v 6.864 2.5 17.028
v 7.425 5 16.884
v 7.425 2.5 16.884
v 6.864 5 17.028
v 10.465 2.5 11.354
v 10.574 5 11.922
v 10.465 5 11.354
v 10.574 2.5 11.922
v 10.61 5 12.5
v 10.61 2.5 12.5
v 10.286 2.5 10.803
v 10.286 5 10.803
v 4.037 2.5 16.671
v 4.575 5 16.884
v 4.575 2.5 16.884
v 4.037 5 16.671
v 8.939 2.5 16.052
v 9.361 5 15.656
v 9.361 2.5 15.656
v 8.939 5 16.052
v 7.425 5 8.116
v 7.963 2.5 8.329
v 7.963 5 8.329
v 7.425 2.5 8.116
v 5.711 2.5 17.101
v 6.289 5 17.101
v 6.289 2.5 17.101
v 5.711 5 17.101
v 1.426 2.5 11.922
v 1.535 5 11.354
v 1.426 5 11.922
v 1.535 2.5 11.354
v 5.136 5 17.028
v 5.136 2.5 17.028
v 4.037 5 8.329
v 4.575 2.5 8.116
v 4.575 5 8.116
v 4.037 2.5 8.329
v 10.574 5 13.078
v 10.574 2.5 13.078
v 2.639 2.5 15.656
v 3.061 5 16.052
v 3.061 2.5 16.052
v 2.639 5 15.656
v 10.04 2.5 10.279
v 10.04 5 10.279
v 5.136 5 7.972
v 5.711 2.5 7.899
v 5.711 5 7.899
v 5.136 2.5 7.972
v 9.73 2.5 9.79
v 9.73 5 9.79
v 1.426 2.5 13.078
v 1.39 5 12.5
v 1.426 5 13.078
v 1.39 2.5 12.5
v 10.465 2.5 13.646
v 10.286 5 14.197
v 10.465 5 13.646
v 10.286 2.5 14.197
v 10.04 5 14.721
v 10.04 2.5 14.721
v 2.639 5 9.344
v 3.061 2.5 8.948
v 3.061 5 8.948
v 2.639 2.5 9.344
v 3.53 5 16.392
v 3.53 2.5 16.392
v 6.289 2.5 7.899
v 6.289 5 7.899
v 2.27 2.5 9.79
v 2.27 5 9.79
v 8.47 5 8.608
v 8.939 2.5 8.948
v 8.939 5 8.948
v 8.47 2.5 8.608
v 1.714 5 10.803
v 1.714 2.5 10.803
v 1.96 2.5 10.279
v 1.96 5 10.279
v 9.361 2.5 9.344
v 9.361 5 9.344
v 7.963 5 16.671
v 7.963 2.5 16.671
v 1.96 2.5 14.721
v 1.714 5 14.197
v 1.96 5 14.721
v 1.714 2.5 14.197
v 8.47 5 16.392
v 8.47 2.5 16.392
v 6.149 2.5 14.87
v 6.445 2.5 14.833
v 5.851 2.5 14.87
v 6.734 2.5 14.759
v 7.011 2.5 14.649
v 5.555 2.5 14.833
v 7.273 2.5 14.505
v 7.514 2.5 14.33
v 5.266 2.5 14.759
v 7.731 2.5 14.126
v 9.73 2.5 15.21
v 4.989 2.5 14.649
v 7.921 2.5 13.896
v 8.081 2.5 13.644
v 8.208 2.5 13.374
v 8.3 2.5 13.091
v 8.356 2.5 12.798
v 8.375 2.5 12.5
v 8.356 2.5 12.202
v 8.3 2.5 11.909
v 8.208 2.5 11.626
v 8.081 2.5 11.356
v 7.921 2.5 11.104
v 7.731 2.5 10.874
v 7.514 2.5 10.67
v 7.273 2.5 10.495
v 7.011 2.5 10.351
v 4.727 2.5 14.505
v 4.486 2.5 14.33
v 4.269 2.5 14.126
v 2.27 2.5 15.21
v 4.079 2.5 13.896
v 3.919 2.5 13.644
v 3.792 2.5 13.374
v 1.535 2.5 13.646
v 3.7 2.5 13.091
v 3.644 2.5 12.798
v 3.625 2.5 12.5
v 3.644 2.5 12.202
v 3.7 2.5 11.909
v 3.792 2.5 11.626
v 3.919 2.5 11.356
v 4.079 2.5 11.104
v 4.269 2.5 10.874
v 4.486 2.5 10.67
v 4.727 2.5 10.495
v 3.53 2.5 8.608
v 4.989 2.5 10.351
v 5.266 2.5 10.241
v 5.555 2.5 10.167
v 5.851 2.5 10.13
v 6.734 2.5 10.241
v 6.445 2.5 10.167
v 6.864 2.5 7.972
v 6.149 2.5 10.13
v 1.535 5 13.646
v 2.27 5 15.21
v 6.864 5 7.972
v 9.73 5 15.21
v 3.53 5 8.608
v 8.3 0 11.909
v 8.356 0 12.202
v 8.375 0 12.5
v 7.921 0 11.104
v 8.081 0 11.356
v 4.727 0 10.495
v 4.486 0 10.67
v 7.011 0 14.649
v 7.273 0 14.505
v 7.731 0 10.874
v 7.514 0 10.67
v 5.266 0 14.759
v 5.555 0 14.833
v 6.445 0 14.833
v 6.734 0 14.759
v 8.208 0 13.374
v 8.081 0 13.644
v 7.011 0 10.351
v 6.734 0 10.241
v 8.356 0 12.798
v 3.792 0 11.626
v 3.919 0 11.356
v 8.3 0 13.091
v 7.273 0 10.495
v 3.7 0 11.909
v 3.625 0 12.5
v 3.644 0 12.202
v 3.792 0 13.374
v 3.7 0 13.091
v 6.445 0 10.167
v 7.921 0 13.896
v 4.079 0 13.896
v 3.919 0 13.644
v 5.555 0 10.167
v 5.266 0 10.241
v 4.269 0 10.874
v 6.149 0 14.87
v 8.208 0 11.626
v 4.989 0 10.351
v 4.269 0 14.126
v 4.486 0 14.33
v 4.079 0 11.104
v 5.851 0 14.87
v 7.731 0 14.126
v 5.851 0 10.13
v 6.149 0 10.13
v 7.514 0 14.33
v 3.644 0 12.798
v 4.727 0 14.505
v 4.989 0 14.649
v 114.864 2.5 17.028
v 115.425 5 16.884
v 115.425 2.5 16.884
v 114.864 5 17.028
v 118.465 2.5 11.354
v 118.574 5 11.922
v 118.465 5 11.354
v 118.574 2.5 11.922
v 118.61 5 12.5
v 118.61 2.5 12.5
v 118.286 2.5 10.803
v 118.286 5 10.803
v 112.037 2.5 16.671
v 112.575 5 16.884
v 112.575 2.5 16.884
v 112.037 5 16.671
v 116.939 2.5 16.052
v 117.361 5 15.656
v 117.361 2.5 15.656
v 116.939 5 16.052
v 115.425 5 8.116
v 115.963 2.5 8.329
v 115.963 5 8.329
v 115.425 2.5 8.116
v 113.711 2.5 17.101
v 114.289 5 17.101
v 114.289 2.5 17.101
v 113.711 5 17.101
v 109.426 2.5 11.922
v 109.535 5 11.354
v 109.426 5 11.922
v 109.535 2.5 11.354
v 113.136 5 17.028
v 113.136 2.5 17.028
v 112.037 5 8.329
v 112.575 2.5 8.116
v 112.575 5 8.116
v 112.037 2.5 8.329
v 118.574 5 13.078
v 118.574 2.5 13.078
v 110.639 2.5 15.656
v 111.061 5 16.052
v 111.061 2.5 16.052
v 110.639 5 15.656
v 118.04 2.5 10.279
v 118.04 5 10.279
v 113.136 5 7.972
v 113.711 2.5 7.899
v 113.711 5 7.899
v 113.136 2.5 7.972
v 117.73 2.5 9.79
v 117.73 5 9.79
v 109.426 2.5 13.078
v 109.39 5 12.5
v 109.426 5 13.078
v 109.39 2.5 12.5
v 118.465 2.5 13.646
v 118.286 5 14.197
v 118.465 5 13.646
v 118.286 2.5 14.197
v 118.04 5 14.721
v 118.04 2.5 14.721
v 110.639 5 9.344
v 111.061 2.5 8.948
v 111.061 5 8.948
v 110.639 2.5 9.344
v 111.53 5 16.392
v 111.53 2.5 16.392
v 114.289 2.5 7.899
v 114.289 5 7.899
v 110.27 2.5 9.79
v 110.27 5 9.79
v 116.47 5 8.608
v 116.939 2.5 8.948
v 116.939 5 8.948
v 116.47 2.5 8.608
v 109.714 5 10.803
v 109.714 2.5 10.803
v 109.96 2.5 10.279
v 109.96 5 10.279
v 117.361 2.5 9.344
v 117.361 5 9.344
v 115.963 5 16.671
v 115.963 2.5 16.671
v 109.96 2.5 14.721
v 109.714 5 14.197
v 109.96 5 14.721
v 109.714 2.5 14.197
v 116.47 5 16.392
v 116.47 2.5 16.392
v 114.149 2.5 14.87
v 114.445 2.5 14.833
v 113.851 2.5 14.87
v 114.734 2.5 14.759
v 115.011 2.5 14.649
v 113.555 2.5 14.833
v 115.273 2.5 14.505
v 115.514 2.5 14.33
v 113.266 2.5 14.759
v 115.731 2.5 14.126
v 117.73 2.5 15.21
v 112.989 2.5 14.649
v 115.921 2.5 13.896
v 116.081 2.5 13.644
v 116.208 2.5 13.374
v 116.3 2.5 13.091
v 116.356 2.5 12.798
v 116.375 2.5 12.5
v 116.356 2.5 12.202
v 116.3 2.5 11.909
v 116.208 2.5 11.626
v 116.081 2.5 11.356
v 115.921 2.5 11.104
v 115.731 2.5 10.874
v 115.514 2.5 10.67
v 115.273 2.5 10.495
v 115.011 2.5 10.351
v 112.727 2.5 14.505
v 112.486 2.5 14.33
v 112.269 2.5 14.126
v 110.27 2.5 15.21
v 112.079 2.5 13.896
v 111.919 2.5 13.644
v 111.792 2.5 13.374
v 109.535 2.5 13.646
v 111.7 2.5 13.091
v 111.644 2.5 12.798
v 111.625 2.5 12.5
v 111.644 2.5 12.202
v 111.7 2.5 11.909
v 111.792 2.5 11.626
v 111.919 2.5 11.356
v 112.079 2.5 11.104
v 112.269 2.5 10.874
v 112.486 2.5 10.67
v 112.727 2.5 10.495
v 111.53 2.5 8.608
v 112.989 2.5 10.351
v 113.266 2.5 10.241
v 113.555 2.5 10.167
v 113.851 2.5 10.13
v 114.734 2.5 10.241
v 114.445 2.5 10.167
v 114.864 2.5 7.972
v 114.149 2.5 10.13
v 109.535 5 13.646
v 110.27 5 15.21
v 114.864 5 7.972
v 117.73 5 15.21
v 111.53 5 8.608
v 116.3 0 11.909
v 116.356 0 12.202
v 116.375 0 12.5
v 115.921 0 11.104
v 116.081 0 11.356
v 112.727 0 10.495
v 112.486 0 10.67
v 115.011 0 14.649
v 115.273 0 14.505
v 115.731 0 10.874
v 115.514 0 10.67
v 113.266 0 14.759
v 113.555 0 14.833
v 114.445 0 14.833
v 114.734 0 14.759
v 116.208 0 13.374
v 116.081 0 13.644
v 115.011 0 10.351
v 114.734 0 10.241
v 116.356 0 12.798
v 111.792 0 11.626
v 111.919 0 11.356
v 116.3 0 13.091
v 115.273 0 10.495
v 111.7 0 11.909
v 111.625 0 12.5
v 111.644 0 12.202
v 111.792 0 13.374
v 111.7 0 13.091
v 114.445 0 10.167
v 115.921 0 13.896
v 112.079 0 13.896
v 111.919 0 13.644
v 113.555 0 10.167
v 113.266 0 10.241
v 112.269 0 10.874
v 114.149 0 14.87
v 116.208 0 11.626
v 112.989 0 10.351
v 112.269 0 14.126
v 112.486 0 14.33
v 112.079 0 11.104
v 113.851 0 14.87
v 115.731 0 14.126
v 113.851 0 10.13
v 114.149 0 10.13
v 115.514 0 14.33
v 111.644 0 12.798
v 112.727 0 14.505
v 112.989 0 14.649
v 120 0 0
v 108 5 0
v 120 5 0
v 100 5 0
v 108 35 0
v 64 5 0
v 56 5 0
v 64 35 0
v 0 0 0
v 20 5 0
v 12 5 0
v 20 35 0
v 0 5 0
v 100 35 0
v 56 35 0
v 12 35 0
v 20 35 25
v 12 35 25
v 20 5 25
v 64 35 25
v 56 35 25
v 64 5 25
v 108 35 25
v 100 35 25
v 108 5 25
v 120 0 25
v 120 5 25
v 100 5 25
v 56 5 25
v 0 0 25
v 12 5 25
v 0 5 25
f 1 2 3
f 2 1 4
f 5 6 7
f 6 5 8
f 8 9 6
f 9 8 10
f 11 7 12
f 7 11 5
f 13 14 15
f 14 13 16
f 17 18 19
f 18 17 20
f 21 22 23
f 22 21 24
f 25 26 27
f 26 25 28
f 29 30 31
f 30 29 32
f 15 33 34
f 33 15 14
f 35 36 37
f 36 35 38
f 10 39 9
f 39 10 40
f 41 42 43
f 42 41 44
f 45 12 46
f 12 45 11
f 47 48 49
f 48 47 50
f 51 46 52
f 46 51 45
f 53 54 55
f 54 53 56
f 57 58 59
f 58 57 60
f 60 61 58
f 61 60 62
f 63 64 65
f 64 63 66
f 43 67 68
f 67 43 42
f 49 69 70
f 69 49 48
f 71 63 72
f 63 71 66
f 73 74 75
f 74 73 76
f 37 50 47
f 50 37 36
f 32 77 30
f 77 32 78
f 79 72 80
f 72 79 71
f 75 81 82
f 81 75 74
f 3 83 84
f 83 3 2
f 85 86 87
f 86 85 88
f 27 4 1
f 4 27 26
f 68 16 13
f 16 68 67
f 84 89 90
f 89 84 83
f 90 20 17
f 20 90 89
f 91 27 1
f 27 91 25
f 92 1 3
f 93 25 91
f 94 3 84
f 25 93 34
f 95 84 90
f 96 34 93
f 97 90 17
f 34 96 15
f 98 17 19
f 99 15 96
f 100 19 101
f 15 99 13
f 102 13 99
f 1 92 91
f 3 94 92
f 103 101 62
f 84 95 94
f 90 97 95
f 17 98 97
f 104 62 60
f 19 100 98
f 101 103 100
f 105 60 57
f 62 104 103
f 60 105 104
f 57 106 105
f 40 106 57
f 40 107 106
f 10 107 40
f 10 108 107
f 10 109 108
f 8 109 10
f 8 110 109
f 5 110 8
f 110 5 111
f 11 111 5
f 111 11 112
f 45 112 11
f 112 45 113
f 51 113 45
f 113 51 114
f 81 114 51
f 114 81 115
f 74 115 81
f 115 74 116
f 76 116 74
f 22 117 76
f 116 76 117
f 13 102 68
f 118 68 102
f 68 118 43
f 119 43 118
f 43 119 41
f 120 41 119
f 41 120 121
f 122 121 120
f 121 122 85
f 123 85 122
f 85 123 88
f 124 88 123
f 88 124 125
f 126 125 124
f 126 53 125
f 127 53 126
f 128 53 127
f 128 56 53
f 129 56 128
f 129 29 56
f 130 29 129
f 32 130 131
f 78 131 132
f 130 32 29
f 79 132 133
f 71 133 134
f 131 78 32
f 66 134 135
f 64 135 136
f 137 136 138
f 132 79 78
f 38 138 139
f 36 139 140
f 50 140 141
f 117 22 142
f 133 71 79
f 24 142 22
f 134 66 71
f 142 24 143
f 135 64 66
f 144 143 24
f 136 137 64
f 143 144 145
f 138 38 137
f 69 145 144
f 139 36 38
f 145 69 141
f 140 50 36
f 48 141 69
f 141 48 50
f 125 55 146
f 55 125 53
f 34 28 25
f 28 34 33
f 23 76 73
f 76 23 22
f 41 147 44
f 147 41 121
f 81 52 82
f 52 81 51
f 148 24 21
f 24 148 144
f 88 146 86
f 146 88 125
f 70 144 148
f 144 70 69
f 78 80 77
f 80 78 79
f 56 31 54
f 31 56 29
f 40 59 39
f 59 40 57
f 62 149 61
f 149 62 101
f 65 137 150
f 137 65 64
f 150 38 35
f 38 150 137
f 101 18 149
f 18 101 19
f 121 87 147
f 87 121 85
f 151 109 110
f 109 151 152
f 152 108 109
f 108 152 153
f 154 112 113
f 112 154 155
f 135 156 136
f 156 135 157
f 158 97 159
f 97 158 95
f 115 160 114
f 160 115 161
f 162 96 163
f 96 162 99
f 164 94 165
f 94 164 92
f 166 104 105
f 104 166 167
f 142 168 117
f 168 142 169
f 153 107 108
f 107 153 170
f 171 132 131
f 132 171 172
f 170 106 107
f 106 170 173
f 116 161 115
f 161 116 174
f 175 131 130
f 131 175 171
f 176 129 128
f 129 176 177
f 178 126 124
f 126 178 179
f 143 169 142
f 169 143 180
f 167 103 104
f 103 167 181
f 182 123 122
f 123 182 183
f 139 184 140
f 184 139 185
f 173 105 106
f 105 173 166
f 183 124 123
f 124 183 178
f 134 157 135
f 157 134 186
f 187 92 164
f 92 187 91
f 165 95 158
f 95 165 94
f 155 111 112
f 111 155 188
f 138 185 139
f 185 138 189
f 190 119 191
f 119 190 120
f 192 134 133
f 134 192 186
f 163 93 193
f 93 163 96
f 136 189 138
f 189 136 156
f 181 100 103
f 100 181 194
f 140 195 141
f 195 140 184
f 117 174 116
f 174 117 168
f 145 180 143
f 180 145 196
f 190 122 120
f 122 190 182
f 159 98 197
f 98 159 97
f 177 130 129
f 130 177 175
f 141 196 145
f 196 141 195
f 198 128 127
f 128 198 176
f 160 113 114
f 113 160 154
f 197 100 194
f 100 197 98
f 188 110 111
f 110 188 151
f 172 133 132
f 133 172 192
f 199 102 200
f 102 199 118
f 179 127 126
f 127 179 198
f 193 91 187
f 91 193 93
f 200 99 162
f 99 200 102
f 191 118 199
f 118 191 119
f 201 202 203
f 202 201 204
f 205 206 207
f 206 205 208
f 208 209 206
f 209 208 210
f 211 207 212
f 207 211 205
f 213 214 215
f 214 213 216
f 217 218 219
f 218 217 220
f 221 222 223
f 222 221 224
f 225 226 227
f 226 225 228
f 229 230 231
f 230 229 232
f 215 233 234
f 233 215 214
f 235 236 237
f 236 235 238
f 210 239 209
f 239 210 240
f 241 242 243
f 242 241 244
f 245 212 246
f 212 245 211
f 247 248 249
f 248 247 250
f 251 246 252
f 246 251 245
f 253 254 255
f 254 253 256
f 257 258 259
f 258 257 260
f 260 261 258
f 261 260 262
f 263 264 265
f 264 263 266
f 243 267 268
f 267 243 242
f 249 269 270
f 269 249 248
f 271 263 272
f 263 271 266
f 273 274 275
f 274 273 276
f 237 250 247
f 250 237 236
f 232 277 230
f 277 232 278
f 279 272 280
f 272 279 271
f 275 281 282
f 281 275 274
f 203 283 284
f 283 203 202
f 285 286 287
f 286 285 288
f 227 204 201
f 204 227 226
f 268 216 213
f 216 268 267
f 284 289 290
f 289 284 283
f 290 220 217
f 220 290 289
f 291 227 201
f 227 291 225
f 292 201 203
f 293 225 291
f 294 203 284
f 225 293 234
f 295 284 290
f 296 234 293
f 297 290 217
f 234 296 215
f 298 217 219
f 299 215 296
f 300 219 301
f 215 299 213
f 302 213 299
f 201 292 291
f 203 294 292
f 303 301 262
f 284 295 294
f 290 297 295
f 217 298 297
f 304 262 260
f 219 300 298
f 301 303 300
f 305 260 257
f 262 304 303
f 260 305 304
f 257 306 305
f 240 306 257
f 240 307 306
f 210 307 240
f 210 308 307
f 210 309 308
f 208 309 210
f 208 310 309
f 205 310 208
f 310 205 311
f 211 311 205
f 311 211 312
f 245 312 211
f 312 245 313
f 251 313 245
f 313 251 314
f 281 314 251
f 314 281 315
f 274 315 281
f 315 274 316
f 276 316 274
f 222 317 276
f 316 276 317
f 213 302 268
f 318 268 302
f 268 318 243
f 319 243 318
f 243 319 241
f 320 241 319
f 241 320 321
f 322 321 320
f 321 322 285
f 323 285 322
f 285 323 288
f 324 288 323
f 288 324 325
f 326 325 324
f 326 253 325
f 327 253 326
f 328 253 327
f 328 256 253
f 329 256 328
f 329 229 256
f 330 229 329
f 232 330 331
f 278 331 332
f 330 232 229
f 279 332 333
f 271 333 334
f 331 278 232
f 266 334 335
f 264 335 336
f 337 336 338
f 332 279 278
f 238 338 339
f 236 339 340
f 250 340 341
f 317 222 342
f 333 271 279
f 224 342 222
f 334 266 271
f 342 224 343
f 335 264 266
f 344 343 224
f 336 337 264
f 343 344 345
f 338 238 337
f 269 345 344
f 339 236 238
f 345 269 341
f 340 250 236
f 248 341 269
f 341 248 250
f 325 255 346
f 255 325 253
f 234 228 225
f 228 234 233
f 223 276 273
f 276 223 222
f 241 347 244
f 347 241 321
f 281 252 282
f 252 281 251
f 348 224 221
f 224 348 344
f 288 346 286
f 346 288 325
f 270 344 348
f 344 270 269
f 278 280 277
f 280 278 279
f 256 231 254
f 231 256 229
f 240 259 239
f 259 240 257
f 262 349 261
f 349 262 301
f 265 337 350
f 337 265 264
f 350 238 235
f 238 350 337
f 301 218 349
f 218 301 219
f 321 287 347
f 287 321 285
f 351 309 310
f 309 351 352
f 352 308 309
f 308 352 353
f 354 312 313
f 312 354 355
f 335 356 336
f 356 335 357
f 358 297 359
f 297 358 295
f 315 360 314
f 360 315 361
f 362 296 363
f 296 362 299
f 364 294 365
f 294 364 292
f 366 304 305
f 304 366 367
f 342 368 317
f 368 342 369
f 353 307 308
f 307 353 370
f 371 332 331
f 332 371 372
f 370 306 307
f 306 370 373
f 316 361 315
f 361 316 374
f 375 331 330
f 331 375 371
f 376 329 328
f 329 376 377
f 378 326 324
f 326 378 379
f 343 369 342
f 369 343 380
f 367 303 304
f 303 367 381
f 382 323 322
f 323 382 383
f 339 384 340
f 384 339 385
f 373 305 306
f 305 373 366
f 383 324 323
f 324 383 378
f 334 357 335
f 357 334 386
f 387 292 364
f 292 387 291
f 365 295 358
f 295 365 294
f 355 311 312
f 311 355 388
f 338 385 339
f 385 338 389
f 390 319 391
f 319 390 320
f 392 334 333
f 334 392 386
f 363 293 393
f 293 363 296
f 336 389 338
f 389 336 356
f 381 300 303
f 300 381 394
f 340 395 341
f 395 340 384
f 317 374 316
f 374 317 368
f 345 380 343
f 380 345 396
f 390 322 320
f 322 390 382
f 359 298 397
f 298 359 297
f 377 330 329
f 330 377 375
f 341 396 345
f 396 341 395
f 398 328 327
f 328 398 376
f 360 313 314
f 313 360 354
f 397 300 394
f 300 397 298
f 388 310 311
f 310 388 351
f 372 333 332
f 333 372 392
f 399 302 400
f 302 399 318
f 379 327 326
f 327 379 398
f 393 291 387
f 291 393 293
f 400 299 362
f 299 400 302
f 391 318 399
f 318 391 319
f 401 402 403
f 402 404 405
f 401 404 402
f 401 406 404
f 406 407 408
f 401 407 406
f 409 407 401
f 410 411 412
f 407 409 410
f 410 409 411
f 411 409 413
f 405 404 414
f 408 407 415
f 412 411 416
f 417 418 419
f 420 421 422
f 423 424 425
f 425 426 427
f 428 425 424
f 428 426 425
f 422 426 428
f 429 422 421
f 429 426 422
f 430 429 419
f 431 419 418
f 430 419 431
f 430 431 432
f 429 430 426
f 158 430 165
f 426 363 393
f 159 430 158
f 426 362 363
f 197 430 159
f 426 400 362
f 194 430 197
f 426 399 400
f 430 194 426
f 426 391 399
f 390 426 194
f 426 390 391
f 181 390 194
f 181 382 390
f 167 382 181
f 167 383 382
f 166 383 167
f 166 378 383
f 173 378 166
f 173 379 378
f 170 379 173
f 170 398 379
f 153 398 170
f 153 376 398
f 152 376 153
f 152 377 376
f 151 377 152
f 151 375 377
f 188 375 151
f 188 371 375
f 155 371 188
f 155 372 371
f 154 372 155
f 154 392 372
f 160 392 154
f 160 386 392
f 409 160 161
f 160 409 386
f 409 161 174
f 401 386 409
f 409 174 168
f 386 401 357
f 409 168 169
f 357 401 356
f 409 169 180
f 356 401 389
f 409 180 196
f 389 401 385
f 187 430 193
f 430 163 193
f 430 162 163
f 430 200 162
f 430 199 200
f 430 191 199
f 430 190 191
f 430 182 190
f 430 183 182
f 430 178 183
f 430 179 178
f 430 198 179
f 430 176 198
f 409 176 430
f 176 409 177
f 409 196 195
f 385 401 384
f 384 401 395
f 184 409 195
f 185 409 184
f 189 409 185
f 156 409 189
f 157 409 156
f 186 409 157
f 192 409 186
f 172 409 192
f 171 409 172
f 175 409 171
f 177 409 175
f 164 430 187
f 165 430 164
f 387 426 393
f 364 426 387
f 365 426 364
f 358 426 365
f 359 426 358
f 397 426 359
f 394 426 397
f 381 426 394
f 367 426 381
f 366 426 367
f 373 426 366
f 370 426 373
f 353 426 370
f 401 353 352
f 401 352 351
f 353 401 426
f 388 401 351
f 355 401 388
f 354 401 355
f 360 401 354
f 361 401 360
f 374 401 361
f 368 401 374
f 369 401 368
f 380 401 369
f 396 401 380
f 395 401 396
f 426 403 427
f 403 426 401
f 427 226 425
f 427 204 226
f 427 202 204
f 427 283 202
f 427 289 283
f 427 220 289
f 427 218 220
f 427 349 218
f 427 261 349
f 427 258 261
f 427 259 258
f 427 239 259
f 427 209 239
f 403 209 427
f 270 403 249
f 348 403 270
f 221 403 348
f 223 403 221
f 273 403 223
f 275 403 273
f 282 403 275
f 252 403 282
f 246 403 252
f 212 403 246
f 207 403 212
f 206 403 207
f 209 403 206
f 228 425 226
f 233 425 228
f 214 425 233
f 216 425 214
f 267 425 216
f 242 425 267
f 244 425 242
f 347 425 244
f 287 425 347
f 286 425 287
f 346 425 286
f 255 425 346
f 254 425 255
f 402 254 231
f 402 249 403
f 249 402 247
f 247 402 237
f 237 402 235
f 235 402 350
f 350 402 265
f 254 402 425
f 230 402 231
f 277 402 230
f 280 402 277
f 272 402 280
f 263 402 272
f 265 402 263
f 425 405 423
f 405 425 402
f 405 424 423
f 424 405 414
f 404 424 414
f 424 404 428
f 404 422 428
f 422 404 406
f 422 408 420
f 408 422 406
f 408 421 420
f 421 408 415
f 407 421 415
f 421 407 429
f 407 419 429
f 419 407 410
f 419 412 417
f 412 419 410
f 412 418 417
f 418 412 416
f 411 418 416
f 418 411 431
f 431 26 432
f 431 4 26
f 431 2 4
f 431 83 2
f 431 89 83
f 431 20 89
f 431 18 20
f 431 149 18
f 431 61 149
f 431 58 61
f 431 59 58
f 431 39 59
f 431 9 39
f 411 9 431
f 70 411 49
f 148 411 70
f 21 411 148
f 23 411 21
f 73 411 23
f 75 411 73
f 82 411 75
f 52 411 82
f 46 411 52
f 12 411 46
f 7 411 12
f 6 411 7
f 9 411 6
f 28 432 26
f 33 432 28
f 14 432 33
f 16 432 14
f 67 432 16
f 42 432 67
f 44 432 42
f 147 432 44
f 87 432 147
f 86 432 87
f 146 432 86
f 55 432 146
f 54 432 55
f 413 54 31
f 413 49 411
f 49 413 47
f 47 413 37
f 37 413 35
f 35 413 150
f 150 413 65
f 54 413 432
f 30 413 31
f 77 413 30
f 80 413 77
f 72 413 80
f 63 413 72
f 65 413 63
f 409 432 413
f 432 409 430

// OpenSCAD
$fn = 50;

a = 120;
b = 25;
c = 5;
d = 30;
e = 12;
f = 36;
g = 8;
h = 9.22/2;
i = 4.75/2;

difference()
{
	color("grey") linear_extrude(height = b) union()
	{
		square(size = [a, c]);
		translate([e, c]) square(size = [g, d]);
		translate([e+g+f, c]) square(size = [g, d]);
		translate([e+g+f+g+f, c]) square(size = [g, d]);
	}

	color("green") translate([e/2, c/2, b/2]) rotate([-90, 0, 0]) union()
	{
		cylinder(r = h, h = c);
		translate([0,0,-c]) cylinder(r = i, h = c);
	}

	color("green") translate([a - e/2, c/2, b/2]) rotate([-90, 0, 0]) union()
	{
		cylinder(r = h, h = c);
		translate([0,0,-c]) cylinder(r = i, h = c);
	}
}
